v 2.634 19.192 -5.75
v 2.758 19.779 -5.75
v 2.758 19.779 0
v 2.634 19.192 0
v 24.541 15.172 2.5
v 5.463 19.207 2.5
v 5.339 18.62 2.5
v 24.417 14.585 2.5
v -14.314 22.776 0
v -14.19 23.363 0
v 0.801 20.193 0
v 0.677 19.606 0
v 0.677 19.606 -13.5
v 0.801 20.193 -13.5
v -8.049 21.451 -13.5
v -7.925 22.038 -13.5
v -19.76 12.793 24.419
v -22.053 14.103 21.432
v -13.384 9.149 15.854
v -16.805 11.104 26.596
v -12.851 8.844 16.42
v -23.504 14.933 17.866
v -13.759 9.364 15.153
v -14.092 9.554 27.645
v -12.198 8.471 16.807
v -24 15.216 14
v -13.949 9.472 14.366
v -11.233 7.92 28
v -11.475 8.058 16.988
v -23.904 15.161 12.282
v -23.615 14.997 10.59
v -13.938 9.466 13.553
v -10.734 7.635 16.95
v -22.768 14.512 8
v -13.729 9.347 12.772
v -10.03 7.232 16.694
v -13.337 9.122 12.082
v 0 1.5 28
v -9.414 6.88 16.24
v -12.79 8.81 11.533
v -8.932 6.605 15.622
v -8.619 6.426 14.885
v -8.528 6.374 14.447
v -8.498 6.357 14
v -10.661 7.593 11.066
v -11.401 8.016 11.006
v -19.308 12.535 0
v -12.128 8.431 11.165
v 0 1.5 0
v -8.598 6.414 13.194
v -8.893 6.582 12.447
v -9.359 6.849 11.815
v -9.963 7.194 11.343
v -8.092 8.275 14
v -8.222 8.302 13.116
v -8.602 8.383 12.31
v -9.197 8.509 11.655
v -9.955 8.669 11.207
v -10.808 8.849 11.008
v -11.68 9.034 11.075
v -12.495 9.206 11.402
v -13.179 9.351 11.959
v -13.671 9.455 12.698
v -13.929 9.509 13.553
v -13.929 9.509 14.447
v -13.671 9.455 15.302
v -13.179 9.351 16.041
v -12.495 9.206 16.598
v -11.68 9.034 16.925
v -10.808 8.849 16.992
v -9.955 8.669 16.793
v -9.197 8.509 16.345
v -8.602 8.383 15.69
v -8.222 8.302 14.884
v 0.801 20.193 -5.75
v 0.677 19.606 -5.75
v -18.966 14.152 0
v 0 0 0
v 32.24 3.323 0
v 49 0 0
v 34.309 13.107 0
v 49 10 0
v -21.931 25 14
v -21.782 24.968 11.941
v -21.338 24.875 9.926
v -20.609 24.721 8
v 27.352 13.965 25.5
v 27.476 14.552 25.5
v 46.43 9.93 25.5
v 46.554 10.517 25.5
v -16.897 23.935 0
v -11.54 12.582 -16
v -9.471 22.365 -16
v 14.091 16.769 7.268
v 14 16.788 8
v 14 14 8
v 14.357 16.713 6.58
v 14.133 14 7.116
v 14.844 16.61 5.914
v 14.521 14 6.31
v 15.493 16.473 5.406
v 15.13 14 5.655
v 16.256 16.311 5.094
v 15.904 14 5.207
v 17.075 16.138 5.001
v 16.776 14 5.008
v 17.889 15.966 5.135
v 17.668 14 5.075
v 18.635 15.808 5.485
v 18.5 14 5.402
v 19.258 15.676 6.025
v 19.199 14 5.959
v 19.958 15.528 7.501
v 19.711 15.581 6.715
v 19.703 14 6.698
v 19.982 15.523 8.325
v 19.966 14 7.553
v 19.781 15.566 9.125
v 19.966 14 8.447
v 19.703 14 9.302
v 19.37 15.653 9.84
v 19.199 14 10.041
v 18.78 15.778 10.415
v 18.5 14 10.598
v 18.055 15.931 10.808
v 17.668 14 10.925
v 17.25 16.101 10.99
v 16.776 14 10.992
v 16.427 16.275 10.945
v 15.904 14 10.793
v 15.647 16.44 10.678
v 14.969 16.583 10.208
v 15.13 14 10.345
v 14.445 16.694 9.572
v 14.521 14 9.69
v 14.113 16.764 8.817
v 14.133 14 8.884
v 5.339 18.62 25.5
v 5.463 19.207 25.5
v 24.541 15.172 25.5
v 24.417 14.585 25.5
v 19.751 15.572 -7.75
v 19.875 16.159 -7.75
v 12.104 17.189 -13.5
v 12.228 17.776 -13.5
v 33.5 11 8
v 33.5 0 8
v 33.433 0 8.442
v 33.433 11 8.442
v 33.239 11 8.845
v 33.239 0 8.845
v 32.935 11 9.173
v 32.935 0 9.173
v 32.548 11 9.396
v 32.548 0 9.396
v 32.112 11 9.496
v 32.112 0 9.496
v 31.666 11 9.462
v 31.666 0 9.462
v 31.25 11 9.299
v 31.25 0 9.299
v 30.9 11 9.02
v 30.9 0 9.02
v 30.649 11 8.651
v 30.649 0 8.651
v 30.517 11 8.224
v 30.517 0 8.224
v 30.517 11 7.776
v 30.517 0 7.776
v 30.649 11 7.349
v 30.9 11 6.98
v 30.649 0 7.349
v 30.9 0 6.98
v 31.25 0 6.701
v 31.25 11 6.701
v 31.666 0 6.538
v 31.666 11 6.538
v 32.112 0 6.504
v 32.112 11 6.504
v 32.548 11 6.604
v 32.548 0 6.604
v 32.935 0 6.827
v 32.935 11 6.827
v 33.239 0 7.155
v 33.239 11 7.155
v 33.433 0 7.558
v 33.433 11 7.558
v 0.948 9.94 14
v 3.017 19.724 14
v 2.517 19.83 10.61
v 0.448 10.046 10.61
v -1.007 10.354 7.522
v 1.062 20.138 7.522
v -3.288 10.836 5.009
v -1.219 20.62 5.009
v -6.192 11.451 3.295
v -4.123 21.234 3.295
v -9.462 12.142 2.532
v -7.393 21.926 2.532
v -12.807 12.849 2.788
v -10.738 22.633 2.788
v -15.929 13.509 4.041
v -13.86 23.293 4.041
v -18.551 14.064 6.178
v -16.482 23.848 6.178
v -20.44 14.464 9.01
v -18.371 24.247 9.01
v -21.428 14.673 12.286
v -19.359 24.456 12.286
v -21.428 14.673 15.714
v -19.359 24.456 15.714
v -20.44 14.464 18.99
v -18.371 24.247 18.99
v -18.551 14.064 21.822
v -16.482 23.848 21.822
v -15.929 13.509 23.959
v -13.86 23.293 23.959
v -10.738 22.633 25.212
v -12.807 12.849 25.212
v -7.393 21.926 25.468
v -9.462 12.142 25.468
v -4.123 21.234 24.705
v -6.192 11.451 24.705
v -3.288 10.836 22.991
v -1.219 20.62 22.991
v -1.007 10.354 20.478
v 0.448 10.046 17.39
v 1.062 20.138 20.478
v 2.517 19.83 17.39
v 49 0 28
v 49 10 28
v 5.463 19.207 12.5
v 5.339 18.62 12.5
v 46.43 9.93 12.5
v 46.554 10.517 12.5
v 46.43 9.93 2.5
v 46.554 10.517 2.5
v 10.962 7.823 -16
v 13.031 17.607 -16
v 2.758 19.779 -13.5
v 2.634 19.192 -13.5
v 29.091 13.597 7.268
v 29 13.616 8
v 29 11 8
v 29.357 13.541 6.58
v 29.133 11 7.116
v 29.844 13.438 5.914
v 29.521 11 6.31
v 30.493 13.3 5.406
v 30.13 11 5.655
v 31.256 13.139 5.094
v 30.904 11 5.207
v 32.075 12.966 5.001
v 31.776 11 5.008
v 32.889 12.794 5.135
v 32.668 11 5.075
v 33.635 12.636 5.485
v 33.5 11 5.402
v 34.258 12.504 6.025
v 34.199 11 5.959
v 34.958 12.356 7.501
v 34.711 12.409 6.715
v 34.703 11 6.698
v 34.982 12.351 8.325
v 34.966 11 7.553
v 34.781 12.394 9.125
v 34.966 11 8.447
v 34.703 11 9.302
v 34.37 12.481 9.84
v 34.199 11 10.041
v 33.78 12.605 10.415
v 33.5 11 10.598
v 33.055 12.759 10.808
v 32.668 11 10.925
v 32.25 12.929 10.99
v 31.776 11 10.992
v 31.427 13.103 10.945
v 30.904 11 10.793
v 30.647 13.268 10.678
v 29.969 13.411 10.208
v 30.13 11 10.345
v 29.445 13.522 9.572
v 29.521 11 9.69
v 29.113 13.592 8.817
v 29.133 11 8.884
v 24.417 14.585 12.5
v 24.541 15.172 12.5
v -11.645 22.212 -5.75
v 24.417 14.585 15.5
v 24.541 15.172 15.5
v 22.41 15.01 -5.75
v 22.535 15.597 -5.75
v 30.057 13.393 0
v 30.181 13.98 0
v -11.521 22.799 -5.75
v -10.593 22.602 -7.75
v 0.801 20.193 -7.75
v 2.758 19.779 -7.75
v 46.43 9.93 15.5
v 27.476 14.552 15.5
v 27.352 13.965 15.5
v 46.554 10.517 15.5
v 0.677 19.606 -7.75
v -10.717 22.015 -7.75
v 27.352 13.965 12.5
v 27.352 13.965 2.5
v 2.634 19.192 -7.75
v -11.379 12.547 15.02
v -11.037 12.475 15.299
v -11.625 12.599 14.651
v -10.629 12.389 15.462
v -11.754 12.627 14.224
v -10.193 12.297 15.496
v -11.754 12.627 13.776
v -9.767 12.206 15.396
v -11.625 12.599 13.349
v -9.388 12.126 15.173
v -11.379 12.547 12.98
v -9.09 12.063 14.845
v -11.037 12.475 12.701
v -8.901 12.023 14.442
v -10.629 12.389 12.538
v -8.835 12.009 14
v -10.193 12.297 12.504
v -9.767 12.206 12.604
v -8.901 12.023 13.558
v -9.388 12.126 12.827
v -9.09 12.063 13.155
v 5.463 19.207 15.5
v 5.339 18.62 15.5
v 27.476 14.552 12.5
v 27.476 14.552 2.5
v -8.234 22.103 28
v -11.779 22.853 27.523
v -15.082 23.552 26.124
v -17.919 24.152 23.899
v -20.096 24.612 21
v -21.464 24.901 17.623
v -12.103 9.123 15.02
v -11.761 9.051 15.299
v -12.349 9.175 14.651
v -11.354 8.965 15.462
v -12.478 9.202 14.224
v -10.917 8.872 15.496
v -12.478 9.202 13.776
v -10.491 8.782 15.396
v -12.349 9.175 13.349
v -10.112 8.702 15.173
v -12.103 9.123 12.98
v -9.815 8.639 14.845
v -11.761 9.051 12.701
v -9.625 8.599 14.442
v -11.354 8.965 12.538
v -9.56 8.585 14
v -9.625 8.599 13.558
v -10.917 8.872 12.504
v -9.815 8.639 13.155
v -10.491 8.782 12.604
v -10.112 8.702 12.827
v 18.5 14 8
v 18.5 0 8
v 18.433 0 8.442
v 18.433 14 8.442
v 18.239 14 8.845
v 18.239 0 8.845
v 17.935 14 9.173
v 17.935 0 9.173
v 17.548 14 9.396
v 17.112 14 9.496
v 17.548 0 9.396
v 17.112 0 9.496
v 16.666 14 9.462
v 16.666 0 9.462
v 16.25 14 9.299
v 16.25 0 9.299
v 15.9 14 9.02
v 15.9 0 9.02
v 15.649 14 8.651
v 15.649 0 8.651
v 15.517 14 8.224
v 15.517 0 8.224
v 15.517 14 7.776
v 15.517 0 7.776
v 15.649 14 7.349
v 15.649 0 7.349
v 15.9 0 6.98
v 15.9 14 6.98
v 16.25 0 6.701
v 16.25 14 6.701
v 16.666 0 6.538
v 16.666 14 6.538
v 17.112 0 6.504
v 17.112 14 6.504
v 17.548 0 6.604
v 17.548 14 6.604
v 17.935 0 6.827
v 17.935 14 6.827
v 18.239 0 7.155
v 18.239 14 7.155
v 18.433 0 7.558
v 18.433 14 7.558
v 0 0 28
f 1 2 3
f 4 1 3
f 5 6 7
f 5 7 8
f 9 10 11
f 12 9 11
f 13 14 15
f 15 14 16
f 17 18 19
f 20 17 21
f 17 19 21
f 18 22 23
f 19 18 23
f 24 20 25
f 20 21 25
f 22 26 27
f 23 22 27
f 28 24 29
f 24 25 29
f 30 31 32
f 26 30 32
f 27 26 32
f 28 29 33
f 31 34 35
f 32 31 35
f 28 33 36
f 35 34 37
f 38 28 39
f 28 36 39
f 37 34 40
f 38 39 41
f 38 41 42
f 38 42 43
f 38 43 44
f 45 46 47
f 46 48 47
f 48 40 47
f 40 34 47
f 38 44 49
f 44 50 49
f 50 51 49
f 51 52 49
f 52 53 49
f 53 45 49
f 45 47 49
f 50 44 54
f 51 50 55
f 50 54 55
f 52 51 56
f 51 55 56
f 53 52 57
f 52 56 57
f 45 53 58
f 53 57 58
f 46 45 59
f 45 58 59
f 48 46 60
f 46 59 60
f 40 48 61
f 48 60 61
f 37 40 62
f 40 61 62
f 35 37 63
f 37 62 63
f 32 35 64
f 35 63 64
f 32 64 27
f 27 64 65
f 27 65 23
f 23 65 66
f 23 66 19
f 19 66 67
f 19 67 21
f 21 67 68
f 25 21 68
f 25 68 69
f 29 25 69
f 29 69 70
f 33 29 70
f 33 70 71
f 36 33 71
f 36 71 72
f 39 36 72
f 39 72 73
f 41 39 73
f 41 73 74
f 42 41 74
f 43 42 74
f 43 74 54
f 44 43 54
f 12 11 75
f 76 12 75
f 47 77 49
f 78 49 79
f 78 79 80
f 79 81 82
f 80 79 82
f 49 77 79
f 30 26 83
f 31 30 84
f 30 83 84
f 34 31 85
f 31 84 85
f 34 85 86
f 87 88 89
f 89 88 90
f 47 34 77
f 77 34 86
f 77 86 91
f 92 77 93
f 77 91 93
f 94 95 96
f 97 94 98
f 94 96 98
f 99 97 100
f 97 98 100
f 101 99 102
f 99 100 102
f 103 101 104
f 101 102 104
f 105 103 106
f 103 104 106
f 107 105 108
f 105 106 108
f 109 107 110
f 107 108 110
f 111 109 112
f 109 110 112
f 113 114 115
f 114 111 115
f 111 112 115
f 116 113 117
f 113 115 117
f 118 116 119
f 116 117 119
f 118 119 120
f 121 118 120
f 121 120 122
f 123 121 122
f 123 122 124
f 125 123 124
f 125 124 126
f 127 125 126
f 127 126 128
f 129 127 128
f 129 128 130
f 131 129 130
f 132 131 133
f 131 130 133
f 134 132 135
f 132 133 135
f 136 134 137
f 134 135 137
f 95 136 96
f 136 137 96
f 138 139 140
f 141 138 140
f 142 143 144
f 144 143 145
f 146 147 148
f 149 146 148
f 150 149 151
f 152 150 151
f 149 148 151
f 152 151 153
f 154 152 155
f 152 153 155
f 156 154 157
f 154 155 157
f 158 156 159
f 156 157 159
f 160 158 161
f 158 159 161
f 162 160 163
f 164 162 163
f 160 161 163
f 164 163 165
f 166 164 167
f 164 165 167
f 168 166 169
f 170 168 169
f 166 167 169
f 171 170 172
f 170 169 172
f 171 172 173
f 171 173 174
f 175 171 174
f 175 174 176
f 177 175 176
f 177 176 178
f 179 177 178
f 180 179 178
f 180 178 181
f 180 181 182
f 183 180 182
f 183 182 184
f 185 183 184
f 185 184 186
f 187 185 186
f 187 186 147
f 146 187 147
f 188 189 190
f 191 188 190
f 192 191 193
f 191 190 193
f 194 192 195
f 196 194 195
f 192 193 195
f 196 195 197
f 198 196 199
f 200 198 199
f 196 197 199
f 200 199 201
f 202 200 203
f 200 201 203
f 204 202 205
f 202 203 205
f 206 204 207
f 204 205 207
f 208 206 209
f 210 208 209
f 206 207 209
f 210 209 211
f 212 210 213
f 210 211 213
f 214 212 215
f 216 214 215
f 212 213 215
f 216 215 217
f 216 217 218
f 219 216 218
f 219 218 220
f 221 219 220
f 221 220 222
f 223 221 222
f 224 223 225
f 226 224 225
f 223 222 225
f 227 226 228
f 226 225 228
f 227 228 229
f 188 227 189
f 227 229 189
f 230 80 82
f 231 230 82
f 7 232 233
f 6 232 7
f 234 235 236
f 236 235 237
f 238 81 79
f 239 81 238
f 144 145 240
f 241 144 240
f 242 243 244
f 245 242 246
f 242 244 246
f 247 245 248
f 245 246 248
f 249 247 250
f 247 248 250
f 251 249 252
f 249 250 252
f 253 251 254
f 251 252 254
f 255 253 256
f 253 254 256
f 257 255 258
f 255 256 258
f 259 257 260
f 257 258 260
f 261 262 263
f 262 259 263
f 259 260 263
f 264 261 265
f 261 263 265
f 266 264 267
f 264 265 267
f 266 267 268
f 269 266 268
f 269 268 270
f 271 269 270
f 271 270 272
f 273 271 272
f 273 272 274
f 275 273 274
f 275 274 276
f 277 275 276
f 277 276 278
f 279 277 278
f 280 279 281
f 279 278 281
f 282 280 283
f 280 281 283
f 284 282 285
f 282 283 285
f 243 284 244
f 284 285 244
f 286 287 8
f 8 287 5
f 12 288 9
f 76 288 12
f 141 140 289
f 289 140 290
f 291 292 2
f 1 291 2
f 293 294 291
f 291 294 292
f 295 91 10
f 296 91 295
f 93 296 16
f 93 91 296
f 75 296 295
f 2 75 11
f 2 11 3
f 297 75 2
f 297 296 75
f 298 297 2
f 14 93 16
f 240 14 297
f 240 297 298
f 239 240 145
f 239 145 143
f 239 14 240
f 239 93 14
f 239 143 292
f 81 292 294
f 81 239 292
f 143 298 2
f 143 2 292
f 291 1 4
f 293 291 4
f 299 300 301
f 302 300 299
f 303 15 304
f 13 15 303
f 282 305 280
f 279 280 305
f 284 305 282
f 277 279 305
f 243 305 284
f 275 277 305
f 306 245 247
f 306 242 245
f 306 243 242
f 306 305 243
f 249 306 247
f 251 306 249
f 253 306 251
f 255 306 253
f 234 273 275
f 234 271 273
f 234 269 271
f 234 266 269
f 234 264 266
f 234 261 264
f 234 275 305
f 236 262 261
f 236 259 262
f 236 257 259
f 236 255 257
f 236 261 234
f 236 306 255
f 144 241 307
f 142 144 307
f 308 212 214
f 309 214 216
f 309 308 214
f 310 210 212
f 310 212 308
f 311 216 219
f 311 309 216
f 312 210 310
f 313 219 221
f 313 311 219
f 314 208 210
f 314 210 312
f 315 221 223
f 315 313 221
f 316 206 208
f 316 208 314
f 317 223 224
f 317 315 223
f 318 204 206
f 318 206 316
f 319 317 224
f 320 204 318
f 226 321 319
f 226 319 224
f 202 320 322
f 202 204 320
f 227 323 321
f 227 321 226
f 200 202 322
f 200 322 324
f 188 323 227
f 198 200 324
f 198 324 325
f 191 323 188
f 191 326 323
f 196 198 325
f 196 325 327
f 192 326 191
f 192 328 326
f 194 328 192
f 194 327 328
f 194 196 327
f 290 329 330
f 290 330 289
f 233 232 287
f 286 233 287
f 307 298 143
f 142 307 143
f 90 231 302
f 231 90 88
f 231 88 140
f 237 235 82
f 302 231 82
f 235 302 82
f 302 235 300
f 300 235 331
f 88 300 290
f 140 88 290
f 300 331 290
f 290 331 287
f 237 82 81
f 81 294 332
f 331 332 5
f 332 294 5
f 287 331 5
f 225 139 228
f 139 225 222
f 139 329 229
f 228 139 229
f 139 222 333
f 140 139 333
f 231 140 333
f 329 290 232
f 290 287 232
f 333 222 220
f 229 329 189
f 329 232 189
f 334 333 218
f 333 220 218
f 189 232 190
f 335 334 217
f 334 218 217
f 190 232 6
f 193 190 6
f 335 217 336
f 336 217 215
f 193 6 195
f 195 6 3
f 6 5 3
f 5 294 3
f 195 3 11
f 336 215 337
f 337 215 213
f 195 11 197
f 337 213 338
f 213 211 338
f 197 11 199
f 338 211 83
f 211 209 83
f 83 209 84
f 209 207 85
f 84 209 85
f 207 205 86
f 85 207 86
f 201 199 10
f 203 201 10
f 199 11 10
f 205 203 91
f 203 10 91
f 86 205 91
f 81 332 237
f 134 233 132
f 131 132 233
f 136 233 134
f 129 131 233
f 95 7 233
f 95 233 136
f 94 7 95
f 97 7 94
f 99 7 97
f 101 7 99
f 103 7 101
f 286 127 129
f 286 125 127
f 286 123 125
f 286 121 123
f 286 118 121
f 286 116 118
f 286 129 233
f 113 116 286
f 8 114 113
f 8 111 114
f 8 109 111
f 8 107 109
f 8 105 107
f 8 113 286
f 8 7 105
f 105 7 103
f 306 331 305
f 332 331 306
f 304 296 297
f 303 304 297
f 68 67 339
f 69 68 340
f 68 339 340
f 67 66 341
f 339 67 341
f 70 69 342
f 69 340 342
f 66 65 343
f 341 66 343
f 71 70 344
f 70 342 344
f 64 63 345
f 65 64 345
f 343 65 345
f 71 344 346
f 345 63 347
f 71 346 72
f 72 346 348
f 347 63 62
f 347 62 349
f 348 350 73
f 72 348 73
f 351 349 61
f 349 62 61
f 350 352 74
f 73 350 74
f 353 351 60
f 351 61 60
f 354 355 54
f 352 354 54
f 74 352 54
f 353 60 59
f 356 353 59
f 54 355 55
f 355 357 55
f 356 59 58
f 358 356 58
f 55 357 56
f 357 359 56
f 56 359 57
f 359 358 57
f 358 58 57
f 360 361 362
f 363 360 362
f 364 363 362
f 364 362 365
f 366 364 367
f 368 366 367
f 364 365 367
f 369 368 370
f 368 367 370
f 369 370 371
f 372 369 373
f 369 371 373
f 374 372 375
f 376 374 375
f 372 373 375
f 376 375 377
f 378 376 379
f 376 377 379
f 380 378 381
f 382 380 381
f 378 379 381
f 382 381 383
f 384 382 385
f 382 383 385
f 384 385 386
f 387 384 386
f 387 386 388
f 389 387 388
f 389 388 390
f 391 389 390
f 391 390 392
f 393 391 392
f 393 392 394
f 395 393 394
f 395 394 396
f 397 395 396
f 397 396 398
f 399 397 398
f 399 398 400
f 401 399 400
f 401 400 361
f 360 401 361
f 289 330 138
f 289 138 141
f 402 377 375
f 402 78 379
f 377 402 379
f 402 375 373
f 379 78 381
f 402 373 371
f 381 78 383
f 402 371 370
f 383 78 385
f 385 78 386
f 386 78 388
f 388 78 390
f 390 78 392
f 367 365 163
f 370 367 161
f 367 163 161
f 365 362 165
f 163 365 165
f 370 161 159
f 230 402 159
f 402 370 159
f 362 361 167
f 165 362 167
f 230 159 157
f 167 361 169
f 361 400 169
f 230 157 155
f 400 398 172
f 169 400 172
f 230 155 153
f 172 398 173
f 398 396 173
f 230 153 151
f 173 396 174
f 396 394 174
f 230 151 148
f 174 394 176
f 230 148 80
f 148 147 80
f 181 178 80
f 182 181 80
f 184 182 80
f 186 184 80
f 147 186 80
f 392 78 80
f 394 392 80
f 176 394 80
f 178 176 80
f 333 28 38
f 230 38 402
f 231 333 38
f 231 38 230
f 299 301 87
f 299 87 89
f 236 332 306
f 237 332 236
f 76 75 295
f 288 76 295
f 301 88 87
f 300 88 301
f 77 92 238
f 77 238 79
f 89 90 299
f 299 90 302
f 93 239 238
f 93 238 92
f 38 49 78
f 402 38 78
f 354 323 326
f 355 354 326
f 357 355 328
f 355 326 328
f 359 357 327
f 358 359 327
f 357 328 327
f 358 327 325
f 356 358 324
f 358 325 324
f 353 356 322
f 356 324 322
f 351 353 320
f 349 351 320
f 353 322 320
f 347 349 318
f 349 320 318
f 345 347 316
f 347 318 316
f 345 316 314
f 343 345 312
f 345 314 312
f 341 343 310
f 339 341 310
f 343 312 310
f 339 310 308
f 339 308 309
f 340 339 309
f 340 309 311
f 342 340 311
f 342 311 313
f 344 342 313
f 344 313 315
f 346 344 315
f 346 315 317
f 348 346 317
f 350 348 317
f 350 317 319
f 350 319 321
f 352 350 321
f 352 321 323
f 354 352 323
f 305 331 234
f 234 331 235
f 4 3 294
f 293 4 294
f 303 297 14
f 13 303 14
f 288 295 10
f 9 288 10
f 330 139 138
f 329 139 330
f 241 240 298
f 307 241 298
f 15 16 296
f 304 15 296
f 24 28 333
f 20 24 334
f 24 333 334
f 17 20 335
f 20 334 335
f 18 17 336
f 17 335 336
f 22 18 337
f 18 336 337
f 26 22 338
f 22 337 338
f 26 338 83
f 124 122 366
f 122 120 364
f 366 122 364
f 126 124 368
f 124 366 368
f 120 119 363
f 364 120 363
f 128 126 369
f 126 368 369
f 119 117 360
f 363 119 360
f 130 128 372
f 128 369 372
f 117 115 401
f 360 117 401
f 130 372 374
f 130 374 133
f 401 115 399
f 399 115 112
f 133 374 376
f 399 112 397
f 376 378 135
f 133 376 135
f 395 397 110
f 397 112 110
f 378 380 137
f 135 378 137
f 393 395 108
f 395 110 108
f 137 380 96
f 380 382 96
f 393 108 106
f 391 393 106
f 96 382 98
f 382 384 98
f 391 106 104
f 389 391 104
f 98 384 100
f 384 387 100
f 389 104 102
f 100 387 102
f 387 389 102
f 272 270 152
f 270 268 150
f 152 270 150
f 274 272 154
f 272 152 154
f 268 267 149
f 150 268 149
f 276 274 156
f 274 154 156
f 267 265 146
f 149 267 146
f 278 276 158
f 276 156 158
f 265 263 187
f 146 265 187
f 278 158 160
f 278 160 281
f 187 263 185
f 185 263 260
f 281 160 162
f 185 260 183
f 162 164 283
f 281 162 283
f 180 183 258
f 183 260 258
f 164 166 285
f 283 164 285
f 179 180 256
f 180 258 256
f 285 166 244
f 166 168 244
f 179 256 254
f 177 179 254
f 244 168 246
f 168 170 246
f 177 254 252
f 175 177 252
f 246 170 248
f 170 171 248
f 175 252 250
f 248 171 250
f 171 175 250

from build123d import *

# Parameters (mm, degrees)
BOSS_EXTRUDE1_DEPTH     = 28
BOSS_EXTRUDE2_DEPTH     = 10
CUT_EXTRUDE1_DEPTH      = 15.675439909
CUT_EXTRUDE1_DEPTH_BACK = 25.887131558
SKETCH3_R               = 11.5
CUT_EXTRUDE2_DEPTH      = 10
SKETCH4_R               = 1.5
CUT_EXTRUDE3_DEPTH      = 26
SKETCH5_W               = 19.5
SKETCH5_H               = 10
SKETCH5_RX              = 1.533173802
SKETCH5_RY              = 1.5
CUT_EXTRUDE4_DEPTH      = 0.6
CUT_EXTRUDE5_REACH      = 13
SKETCH6_R               = 3
CUT_EXTRUDE6_REACH      = 16
SKETCH7_R               = 3
CUT_EXTRUDE7_REACH      = 16.887
SKETCH8_R               = 1.5
CUT_EXTRUDE8_REACH      = 13.387
SKETCH9_R               = 3


with BuildPart() as part:
    # Sketch1 → Boss-Extrude1 (new body)
    with BuildSketch(Plane.XY):
        Polygon((0, 0), (49, 0), (49, 10), (-21.931026719, 25), (-24, 15.216373394), (0, 1.5), align=None)
    extrude(amount=BOSS_EXTRUDE1_DEPTH)

    # Sketch2 → Boss-Extrude2 (add)
    with BuildSketch(Plane(origin=(4.121724919, 19.490545356, 0), x_dir=(0.978362661, -0.206897328, 0), z_dir=(0.206897328, 0.978362661, 0))):
        Polygon((-13.893841917, 16), (-21.483308301, 0), (30.854721254, 0), (9.106158083, 16), align=None)
    extrude(amount=-BOSS_EXTRUDE2_DEPTH)

    # Sketch2<3> → Cut-Extrude1 (cut, two sides)
    with BuildSketch(Plane(origin=(4.121724919, 19.490545356, 0), x_dir=(0.978362661, -0.206897328, 0), z_dir=(0.206897328, 0.978362661, 0))) as cut_extrude1_sk:
        with BuildLine():
            ThreePointArc((-12.628930853, -28), (-22.528425788, -23.899494938), (-26.628930853, -14.000000004))
            Line((-26.628930853, -14.000000004), (-26.628930853, -28))
            Line((-26.628930853, -28), (-12.628930853, -28))
        make_face()
        with BuildLine():
            Line((-25.278041493, -8), (-21.483308301, 0))
            Line((-21.483308301, 0), (-26.628930853, 0))
            Line((-26.628930853, 0), (-26.628930853, -14.000000004))
            ThreePointArc((-26.628930853, -14.000000004), (-26.287033741, -10.924902359), (-25.278041493, -8))
        make_face()
    extrude(amount=CUT_EXTRUDE1_DEPTH, mode=Mode.SUBTRACT)
    extrude(cut_extrude1_sk.sketch, amount=-CUT_EXTRUDE1_DEPTH_BACK, mode=Mode.SUBTRACT)

    # Sketch3 → Cut-Extrude2 (cut)
    with BuildSketch(Plane(origin=(4.121724919, 19.490545356, 0), x_dir=(0.978362661, -0.206897328, 0), z_dir=(0.206897328, 0.978362661, 0))):
        with Locations((-12.628930853, -14)):
            Circle(SKETCH3_R)
    extrude(amount=-CUT_EXTRUDE2_DEPTH, mode=Mode.SUBTRACT)

    # Sketch4 → Cut-Extrude3 (cut, through all)
    with BuildSketch(Plane.XZ):
        with Locations((17, 8)):
            Circle(SKETCH4_R)
        with Locations((32, 8)):
            Circle(SKETCH4_R)
    extrude(amount=-CUT_EXTRUDE3_DEPTH, mode=Mode.SUBTRACT)

    # Sketch5 → Cut-Extrude4 (cut)
    with BuildSketch(Plane(origin=(4.121724919, 19.490545356, 0), x_dir=(0.978362661, -0.206897328, 0), z_dir=(0.206897328, 0.978362661, 0))):
        Polygon((-18.716315349, 0), (-3.393841917, 0), (-3.393841917, 5.75), (-15.988850867, 5.75), align=None)
        Polygon((-15.040167569, 7.75), (-3.393841917, 7.75), (-3.393841917, 13.5), (-12.312703087, 13.5), align=None)
        Polygon((-1.393841917, 7.75), (16.101510968, 7.75), (8.285621079, 13.5), (-1.393841917, 13.5), align=None)
        Polygon((20.870933117, 0), (23.870933117, 0), (26.635971254, 0), (18.820081364, 5.75), (-1.393841917, 5.75), (-1.393841917, 0), (1.370933117, 0), align=None)
        with Locations((11.120933117, -7.5)):
            Rectangle(SKETCH5_W, SKETCH5_H)
        with BuildLine():
            add(Edge.make_bspline(
                [(14.696263114, -8), (14.696263114, -5.401923789), (12.396502412, -6.700961894), (10.096741709, -8), (12.396502412, -9.299038106), (14.696263114, -10.598076211), (14.696263114, -8)],
                knots=[0, 0, 0, 2.094395102, 2.094395102, 4.188790205, 4.188790205, 6.283185307, 6.283185307, 6.283185307], degree=2, weights=[1, 0.5, 1, 0.5, 1, 0.5, 1]))
        make_face(mode=Mode.SUBTRACT)
        with Locations((11.120933117, -20.5)):
            Rectangle(SKETCH5_W, SKETCH5_H)
        with Locations((33.620933117, -20.5)):
            Rectangle(SKETCH5_W, SKETCH5_H)
        with Locations((33.620933117, -7.5)):
            Rectangle(SKETCH5_W, SKETCH5_H)
        with BuildLine():
            add(Edge.make_bspline(
                [(30.028001134, -8), (30.028001134, -5.401923789), (27.728240431, -6.700961894), (25.428479728, -8), (27.728240431, -9.299038106), (30.028001134, -10.598076211), (30.028001134, -8)],
                knots=[0, 0, 0, 2.094395102, 2.094395102, 4.188790205, 4.188790205, 6.283185307, 6.283185307, 6.283185307], degree=2, weights=[1, 0.5, 1, 0.5, 1, 0.5, 1]))
        make_face(mode=Mode.SUBTRACT)
        with Locations((13.163089313, -8)):
            Ellipse(SKETCH5_RX, SKETCH5_RY)
        with Locations((28.494827332, -8)):
            Ellipse(SKETCH5_RX, SKETCH5_RY)
    extrude(amount=-CUT_EXTRUDE4_DEPTH, mode=Mode.SUBTRACT)

    # Sketch6 → Cut-Extrude5 (cut, up to next)
    with BuildSketch(Plane(origin=(0, 14, 0), x_dir=(-1, 0, 0), z_dir=(0, -1, 0)), mode=Mode.PRIVATE) as cut_extrude5_sk1:
        with Locations((-17, -8)):
            Circle(SKETCH6_R)
    cut_extrude5_tool1 = extrude(cut_extrude5_sk1.sketch, amount=-CUT_EXTRUDE5_REACH, mode=Mode.PRIVATE) & part.part
    add(cut_extrude5_tool1.solids().sort_by_distance((17, 14, 8))[0], mode=Mode.SUBTRACT)

    # Sketch7 → Cut-Extrude6 (cut, up to next)
    with BuildSketch(Plane(origin=(0, 11, 0), x_dir=(-1, 0, 0), z_dir=(0, -1, 0)), mode=Mode.PRIVATE) as cut_extrude6_sk1:
        with Locations((-32, -8)):
            Circle(SKETCH7_R)
    cut_extrude6_tool1 = extrude(cut_extrude6_sk1.sketch, amount=-CUT_EXTRUDE6_REACH, mode=Mode.PRIVATE) & part.part
    add(cut_extrude6_tool1.solids().sort_by_distance((32, 11, 8))[0], mode=Mode.SUBTRACT)

    # Sketch8 → Cut-Extrude7 (cut, up to next)
    with BuildSketch(Plane(origin=(2.052751638, 9.70691875, 0), x_dir=(0.978362661, -0.206897328, 0), z_dir=(0.206897328, 0.978362661, 0)), mode=Mode.PRIVATE) as cut_extrude7_sk1:
        with Locations((-12.628930853, -14)):
            Circle(SKETCH8_R)
    cut_extrude7_tool1 = extrude(cut_extrude7_sk1.sketch, amount=-CUT_EXTRUDE7_REACH, mode=Mode.PRIVATE) & part.part
    add(cut_extrude7_tool1.solids().sort_by_distance((-10.302923, 12.319811, 14))[0], mode=Mode.SUBTRACT)

    # Sketch9 → Cut-Extrude8 (cut, up to next)
    with BuildSketch(Plane(origin=(1.328610989, 6.282649438, 0), x_dir=(0.978362661, -0.206897328, 0), z_dir=(0.206897328, 0.978362661, 0)), mode=Mode.PRIVATE) as cut_extrude8_sk1:
        with Locations((-12.628930853, -14)):
            Circle(SKETCH9_R)
    cut_extrude8_tool1 = extrude(cut_extrude8_sk1.sketch, amount=-CUT_EXTRUDE8_REACH, mode=Mode.PRIVATE) & part.part
    add(cut_extrude8_tool1.solids().sort_by_distance((-11.027063, 8.895541, 14))[0], mode=Mode.SUBTRACT)


solid = part.part
